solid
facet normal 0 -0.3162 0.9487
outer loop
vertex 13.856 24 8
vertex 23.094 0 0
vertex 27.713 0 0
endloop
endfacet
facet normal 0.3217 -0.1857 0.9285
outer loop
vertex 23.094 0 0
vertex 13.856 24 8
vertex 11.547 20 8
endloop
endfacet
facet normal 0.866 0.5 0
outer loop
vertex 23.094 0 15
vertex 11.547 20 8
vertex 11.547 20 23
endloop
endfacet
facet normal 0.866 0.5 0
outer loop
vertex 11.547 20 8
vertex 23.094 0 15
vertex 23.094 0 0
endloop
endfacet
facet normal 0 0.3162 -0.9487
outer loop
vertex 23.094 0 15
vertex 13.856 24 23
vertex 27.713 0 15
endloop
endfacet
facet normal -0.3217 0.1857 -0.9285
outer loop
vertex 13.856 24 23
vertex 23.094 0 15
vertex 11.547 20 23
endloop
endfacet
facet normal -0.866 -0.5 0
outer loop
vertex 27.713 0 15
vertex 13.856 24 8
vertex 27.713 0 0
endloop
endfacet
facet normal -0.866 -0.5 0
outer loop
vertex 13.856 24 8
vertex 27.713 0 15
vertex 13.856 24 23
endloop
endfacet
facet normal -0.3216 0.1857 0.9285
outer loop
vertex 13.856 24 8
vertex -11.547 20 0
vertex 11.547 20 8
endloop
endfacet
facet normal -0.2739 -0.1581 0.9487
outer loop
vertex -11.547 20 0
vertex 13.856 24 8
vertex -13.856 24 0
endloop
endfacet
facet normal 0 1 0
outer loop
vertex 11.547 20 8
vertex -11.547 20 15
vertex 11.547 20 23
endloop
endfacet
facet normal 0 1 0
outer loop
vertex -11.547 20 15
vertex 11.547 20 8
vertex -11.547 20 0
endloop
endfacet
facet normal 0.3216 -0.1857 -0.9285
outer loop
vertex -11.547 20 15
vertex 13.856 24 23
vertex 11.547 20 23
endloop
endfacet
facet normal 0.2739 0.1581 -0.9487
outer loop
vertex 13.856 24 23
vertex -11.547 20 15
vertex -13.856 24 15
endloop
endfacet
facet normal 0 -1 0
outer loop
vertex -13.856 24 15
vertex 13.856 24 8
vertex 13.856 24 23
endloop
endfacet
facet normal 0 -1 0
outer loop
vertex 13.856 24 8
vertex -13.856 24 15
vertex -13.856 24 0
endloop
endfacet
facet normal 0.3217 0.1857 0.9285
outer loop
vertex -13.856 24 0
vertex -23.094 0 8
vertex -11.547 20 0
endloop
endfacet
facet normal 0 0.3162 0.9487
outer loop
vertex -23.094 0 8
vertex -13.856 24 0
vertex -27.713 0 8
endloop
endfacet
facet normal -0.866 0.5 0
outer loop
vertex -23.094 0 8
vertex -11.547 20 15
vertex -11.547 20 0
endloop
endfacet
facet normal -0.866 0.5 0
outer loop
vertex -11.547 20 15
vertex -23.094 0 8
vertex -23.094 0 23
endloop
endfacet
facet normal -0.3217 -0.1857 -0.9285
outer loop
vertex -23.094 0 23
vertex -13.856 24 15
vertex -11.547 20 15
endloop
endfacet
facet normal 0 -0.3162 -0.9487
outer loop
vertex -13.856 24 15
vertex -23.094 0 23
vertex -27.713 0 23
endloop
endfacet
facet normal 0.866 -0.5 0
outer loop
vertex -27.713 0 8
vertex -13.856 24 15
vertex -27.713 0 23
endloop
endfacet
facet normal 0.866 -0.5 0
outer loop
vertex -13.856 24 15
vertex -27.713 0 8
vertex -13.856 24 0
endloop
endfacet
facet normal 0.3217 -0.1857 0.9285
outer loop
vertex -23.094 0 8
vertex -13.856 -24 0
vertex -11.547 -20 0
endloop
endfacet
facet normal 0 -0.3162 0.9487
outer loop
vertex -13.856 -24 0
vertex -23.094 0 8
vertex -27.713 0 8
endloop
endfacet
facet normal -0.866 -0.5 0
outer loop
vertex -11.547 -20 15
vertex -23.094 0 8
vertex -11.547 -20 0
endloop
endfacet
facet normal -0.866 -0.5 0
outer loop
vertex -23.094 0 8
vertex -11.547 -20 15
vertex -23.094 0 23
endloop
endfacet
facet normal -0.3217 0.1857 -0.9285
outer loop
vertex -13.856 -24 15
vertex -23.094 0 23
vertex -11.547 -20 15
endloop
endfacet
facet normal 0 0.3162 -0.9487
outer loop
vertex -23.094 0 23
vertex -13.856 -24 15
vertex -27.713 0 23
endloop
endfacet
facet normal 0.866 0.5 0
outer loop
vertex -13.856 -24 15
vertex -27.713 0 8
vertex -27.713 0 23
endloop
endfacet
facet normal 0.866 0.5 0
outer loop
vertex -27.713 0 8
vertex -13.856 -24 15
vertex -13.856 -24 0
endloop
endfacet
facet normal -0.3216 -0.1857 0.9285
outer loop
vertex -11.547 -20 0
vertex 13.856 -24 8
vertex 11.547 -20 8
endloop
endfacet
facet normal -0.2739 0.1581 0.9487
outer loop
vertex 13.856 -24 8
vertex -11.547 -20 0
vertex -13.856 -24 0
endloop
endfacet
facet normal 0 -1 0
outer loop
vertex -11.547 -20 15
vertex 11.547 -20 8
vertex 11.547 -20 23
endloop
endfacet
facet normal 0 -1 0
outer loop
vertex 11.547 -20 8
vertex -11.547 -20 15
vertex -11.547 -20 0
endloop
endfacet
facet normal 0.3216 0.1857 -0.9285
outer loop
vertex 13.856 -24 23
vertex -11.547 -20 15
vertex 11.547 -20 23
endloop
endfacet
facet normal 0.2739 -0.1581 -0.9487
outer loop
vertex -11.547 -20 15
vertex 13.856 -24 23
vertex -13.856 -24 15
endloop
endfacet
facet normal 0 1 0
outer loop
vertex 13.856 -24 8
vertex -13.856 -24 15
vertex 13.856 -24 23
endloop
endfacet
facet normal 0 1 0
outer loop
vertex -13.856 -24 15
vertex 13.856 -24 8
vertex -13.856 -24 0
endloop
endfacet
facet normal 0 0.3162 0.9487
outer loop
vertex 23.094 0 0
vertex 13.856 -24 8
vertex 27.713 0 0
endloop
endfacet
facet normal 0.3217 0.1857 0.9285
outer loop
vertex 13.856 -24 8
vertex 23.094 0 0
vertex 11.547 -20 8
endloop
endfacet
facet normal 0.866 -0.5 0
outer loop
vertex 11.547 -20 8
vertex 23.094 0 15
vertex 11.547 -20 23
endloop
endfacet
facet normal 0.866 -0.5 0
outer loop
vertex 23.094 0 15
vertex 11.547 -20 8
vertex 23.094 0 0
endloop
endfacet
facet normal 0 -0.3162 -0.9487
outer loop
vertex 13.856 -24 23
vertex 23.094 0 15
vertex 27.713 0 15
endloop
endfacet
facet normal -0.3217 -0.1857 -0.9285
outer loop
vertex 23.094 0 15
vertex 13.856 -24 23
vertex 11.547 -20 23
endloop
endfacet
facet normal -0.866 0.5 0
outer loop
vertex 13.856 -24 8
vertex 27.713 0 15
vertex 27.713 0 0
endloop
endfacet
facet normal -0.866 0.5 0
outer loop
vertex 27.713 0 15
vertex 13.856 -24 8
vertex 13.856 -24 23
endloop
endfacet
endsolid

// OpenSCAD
$fs = $preview ? 10 : 1;

// should include slop!
h_soap = 15;
// should include slop!
d_soap = 40;
wall_thickness = 4;
foot_height = 8;

h_magnet = 2;
d_magnet = 4;

hole_spacing = 15;
hole_percent = 75;
/*
# travel soap container
draining epoxy-coated travel soap bar container

## constraints
I want to make something to hold my travel soap bars with the following constraints
1. waterproof - sealed with epoxy resin
2. draining
3. compact
4. sealed completely when closed
5. doesn't drain on top of eachother
6. needs to hold 3 pucks: soap, shampoo, conditioner

## ideation
* so one design could be like stacking cups with two diameters, holes on the bottom and a lid on top.
    * the bottommost one needs an extra lid for transport
* what if there was a shaft that the holders swung out from?
* what if I got some tins -> no draining
* what if it was held together with magnets? then I wouldn't have to worry about expoxy affecting clearances

## final design
five parts: a top lid, three chambers and a bottom lid. hexagons, just for funsies

##for version 2
the chambers could have three sloping feet that nest with the chamber below. one traingle wave
*/
/*
* the problem is making it seal e. the geometry of the top must mate with the geometry of the bottom
* even though both have a coat of epoxy of an unknown thickness! this is not trivial...
    * a ball and socket is not possible
    * two planes does work
    * a cone works
    * a corner to a corner works
* the problem can be formalied as follows: find two surfaces embedded in 3d space such that when either surface is
       explanded in the local normal direction they can still mate
 */
/*
none of this really matters since I already decided that the corners will touch the ground at two points
 */

function cyl2cart(r, theta,z) = [r*cos(theta),r*sin(theta), z];

r_0 = d_soap / 2 * (1 / sin(60));
r_1 = (d_soap / 2 + wall_thickness) * (1 / sin(60));
h_0 = 0;
h_1 = h_soap;

angles = [0,1,2,3,4,5]*360/6;
//echo(angles);
proto_points = [[r_0, h_0], [r_0, h_1], [r_1, h_1], [r_1, h_0]];
function sector(idx)=[for(pp=proto_points) [pp[0],idx*360/6,pp[1]+(idx%2)*foot_height]];

cyl_points = [for (idx=[0:5]) each sector(idx)];
//echo(cyl_points);
points = [for (cyl_point = cyl_points) cyl2cart(cyl_point[0],cyl_point[1],cyl_point[2])];
//echo(points);
//for(point=points) translate(point) cube(center=true);
proto_faces = [[0,4,7,3], [1,5,4,0],[2,6,5,1],[3,7,6,2]];
faces = [for(i=[0:5]) each [for (pf=proto_faces) [for(j=pf) (j+i*4)%24]]];
//
polyhedron(points=points,faces=faces);
